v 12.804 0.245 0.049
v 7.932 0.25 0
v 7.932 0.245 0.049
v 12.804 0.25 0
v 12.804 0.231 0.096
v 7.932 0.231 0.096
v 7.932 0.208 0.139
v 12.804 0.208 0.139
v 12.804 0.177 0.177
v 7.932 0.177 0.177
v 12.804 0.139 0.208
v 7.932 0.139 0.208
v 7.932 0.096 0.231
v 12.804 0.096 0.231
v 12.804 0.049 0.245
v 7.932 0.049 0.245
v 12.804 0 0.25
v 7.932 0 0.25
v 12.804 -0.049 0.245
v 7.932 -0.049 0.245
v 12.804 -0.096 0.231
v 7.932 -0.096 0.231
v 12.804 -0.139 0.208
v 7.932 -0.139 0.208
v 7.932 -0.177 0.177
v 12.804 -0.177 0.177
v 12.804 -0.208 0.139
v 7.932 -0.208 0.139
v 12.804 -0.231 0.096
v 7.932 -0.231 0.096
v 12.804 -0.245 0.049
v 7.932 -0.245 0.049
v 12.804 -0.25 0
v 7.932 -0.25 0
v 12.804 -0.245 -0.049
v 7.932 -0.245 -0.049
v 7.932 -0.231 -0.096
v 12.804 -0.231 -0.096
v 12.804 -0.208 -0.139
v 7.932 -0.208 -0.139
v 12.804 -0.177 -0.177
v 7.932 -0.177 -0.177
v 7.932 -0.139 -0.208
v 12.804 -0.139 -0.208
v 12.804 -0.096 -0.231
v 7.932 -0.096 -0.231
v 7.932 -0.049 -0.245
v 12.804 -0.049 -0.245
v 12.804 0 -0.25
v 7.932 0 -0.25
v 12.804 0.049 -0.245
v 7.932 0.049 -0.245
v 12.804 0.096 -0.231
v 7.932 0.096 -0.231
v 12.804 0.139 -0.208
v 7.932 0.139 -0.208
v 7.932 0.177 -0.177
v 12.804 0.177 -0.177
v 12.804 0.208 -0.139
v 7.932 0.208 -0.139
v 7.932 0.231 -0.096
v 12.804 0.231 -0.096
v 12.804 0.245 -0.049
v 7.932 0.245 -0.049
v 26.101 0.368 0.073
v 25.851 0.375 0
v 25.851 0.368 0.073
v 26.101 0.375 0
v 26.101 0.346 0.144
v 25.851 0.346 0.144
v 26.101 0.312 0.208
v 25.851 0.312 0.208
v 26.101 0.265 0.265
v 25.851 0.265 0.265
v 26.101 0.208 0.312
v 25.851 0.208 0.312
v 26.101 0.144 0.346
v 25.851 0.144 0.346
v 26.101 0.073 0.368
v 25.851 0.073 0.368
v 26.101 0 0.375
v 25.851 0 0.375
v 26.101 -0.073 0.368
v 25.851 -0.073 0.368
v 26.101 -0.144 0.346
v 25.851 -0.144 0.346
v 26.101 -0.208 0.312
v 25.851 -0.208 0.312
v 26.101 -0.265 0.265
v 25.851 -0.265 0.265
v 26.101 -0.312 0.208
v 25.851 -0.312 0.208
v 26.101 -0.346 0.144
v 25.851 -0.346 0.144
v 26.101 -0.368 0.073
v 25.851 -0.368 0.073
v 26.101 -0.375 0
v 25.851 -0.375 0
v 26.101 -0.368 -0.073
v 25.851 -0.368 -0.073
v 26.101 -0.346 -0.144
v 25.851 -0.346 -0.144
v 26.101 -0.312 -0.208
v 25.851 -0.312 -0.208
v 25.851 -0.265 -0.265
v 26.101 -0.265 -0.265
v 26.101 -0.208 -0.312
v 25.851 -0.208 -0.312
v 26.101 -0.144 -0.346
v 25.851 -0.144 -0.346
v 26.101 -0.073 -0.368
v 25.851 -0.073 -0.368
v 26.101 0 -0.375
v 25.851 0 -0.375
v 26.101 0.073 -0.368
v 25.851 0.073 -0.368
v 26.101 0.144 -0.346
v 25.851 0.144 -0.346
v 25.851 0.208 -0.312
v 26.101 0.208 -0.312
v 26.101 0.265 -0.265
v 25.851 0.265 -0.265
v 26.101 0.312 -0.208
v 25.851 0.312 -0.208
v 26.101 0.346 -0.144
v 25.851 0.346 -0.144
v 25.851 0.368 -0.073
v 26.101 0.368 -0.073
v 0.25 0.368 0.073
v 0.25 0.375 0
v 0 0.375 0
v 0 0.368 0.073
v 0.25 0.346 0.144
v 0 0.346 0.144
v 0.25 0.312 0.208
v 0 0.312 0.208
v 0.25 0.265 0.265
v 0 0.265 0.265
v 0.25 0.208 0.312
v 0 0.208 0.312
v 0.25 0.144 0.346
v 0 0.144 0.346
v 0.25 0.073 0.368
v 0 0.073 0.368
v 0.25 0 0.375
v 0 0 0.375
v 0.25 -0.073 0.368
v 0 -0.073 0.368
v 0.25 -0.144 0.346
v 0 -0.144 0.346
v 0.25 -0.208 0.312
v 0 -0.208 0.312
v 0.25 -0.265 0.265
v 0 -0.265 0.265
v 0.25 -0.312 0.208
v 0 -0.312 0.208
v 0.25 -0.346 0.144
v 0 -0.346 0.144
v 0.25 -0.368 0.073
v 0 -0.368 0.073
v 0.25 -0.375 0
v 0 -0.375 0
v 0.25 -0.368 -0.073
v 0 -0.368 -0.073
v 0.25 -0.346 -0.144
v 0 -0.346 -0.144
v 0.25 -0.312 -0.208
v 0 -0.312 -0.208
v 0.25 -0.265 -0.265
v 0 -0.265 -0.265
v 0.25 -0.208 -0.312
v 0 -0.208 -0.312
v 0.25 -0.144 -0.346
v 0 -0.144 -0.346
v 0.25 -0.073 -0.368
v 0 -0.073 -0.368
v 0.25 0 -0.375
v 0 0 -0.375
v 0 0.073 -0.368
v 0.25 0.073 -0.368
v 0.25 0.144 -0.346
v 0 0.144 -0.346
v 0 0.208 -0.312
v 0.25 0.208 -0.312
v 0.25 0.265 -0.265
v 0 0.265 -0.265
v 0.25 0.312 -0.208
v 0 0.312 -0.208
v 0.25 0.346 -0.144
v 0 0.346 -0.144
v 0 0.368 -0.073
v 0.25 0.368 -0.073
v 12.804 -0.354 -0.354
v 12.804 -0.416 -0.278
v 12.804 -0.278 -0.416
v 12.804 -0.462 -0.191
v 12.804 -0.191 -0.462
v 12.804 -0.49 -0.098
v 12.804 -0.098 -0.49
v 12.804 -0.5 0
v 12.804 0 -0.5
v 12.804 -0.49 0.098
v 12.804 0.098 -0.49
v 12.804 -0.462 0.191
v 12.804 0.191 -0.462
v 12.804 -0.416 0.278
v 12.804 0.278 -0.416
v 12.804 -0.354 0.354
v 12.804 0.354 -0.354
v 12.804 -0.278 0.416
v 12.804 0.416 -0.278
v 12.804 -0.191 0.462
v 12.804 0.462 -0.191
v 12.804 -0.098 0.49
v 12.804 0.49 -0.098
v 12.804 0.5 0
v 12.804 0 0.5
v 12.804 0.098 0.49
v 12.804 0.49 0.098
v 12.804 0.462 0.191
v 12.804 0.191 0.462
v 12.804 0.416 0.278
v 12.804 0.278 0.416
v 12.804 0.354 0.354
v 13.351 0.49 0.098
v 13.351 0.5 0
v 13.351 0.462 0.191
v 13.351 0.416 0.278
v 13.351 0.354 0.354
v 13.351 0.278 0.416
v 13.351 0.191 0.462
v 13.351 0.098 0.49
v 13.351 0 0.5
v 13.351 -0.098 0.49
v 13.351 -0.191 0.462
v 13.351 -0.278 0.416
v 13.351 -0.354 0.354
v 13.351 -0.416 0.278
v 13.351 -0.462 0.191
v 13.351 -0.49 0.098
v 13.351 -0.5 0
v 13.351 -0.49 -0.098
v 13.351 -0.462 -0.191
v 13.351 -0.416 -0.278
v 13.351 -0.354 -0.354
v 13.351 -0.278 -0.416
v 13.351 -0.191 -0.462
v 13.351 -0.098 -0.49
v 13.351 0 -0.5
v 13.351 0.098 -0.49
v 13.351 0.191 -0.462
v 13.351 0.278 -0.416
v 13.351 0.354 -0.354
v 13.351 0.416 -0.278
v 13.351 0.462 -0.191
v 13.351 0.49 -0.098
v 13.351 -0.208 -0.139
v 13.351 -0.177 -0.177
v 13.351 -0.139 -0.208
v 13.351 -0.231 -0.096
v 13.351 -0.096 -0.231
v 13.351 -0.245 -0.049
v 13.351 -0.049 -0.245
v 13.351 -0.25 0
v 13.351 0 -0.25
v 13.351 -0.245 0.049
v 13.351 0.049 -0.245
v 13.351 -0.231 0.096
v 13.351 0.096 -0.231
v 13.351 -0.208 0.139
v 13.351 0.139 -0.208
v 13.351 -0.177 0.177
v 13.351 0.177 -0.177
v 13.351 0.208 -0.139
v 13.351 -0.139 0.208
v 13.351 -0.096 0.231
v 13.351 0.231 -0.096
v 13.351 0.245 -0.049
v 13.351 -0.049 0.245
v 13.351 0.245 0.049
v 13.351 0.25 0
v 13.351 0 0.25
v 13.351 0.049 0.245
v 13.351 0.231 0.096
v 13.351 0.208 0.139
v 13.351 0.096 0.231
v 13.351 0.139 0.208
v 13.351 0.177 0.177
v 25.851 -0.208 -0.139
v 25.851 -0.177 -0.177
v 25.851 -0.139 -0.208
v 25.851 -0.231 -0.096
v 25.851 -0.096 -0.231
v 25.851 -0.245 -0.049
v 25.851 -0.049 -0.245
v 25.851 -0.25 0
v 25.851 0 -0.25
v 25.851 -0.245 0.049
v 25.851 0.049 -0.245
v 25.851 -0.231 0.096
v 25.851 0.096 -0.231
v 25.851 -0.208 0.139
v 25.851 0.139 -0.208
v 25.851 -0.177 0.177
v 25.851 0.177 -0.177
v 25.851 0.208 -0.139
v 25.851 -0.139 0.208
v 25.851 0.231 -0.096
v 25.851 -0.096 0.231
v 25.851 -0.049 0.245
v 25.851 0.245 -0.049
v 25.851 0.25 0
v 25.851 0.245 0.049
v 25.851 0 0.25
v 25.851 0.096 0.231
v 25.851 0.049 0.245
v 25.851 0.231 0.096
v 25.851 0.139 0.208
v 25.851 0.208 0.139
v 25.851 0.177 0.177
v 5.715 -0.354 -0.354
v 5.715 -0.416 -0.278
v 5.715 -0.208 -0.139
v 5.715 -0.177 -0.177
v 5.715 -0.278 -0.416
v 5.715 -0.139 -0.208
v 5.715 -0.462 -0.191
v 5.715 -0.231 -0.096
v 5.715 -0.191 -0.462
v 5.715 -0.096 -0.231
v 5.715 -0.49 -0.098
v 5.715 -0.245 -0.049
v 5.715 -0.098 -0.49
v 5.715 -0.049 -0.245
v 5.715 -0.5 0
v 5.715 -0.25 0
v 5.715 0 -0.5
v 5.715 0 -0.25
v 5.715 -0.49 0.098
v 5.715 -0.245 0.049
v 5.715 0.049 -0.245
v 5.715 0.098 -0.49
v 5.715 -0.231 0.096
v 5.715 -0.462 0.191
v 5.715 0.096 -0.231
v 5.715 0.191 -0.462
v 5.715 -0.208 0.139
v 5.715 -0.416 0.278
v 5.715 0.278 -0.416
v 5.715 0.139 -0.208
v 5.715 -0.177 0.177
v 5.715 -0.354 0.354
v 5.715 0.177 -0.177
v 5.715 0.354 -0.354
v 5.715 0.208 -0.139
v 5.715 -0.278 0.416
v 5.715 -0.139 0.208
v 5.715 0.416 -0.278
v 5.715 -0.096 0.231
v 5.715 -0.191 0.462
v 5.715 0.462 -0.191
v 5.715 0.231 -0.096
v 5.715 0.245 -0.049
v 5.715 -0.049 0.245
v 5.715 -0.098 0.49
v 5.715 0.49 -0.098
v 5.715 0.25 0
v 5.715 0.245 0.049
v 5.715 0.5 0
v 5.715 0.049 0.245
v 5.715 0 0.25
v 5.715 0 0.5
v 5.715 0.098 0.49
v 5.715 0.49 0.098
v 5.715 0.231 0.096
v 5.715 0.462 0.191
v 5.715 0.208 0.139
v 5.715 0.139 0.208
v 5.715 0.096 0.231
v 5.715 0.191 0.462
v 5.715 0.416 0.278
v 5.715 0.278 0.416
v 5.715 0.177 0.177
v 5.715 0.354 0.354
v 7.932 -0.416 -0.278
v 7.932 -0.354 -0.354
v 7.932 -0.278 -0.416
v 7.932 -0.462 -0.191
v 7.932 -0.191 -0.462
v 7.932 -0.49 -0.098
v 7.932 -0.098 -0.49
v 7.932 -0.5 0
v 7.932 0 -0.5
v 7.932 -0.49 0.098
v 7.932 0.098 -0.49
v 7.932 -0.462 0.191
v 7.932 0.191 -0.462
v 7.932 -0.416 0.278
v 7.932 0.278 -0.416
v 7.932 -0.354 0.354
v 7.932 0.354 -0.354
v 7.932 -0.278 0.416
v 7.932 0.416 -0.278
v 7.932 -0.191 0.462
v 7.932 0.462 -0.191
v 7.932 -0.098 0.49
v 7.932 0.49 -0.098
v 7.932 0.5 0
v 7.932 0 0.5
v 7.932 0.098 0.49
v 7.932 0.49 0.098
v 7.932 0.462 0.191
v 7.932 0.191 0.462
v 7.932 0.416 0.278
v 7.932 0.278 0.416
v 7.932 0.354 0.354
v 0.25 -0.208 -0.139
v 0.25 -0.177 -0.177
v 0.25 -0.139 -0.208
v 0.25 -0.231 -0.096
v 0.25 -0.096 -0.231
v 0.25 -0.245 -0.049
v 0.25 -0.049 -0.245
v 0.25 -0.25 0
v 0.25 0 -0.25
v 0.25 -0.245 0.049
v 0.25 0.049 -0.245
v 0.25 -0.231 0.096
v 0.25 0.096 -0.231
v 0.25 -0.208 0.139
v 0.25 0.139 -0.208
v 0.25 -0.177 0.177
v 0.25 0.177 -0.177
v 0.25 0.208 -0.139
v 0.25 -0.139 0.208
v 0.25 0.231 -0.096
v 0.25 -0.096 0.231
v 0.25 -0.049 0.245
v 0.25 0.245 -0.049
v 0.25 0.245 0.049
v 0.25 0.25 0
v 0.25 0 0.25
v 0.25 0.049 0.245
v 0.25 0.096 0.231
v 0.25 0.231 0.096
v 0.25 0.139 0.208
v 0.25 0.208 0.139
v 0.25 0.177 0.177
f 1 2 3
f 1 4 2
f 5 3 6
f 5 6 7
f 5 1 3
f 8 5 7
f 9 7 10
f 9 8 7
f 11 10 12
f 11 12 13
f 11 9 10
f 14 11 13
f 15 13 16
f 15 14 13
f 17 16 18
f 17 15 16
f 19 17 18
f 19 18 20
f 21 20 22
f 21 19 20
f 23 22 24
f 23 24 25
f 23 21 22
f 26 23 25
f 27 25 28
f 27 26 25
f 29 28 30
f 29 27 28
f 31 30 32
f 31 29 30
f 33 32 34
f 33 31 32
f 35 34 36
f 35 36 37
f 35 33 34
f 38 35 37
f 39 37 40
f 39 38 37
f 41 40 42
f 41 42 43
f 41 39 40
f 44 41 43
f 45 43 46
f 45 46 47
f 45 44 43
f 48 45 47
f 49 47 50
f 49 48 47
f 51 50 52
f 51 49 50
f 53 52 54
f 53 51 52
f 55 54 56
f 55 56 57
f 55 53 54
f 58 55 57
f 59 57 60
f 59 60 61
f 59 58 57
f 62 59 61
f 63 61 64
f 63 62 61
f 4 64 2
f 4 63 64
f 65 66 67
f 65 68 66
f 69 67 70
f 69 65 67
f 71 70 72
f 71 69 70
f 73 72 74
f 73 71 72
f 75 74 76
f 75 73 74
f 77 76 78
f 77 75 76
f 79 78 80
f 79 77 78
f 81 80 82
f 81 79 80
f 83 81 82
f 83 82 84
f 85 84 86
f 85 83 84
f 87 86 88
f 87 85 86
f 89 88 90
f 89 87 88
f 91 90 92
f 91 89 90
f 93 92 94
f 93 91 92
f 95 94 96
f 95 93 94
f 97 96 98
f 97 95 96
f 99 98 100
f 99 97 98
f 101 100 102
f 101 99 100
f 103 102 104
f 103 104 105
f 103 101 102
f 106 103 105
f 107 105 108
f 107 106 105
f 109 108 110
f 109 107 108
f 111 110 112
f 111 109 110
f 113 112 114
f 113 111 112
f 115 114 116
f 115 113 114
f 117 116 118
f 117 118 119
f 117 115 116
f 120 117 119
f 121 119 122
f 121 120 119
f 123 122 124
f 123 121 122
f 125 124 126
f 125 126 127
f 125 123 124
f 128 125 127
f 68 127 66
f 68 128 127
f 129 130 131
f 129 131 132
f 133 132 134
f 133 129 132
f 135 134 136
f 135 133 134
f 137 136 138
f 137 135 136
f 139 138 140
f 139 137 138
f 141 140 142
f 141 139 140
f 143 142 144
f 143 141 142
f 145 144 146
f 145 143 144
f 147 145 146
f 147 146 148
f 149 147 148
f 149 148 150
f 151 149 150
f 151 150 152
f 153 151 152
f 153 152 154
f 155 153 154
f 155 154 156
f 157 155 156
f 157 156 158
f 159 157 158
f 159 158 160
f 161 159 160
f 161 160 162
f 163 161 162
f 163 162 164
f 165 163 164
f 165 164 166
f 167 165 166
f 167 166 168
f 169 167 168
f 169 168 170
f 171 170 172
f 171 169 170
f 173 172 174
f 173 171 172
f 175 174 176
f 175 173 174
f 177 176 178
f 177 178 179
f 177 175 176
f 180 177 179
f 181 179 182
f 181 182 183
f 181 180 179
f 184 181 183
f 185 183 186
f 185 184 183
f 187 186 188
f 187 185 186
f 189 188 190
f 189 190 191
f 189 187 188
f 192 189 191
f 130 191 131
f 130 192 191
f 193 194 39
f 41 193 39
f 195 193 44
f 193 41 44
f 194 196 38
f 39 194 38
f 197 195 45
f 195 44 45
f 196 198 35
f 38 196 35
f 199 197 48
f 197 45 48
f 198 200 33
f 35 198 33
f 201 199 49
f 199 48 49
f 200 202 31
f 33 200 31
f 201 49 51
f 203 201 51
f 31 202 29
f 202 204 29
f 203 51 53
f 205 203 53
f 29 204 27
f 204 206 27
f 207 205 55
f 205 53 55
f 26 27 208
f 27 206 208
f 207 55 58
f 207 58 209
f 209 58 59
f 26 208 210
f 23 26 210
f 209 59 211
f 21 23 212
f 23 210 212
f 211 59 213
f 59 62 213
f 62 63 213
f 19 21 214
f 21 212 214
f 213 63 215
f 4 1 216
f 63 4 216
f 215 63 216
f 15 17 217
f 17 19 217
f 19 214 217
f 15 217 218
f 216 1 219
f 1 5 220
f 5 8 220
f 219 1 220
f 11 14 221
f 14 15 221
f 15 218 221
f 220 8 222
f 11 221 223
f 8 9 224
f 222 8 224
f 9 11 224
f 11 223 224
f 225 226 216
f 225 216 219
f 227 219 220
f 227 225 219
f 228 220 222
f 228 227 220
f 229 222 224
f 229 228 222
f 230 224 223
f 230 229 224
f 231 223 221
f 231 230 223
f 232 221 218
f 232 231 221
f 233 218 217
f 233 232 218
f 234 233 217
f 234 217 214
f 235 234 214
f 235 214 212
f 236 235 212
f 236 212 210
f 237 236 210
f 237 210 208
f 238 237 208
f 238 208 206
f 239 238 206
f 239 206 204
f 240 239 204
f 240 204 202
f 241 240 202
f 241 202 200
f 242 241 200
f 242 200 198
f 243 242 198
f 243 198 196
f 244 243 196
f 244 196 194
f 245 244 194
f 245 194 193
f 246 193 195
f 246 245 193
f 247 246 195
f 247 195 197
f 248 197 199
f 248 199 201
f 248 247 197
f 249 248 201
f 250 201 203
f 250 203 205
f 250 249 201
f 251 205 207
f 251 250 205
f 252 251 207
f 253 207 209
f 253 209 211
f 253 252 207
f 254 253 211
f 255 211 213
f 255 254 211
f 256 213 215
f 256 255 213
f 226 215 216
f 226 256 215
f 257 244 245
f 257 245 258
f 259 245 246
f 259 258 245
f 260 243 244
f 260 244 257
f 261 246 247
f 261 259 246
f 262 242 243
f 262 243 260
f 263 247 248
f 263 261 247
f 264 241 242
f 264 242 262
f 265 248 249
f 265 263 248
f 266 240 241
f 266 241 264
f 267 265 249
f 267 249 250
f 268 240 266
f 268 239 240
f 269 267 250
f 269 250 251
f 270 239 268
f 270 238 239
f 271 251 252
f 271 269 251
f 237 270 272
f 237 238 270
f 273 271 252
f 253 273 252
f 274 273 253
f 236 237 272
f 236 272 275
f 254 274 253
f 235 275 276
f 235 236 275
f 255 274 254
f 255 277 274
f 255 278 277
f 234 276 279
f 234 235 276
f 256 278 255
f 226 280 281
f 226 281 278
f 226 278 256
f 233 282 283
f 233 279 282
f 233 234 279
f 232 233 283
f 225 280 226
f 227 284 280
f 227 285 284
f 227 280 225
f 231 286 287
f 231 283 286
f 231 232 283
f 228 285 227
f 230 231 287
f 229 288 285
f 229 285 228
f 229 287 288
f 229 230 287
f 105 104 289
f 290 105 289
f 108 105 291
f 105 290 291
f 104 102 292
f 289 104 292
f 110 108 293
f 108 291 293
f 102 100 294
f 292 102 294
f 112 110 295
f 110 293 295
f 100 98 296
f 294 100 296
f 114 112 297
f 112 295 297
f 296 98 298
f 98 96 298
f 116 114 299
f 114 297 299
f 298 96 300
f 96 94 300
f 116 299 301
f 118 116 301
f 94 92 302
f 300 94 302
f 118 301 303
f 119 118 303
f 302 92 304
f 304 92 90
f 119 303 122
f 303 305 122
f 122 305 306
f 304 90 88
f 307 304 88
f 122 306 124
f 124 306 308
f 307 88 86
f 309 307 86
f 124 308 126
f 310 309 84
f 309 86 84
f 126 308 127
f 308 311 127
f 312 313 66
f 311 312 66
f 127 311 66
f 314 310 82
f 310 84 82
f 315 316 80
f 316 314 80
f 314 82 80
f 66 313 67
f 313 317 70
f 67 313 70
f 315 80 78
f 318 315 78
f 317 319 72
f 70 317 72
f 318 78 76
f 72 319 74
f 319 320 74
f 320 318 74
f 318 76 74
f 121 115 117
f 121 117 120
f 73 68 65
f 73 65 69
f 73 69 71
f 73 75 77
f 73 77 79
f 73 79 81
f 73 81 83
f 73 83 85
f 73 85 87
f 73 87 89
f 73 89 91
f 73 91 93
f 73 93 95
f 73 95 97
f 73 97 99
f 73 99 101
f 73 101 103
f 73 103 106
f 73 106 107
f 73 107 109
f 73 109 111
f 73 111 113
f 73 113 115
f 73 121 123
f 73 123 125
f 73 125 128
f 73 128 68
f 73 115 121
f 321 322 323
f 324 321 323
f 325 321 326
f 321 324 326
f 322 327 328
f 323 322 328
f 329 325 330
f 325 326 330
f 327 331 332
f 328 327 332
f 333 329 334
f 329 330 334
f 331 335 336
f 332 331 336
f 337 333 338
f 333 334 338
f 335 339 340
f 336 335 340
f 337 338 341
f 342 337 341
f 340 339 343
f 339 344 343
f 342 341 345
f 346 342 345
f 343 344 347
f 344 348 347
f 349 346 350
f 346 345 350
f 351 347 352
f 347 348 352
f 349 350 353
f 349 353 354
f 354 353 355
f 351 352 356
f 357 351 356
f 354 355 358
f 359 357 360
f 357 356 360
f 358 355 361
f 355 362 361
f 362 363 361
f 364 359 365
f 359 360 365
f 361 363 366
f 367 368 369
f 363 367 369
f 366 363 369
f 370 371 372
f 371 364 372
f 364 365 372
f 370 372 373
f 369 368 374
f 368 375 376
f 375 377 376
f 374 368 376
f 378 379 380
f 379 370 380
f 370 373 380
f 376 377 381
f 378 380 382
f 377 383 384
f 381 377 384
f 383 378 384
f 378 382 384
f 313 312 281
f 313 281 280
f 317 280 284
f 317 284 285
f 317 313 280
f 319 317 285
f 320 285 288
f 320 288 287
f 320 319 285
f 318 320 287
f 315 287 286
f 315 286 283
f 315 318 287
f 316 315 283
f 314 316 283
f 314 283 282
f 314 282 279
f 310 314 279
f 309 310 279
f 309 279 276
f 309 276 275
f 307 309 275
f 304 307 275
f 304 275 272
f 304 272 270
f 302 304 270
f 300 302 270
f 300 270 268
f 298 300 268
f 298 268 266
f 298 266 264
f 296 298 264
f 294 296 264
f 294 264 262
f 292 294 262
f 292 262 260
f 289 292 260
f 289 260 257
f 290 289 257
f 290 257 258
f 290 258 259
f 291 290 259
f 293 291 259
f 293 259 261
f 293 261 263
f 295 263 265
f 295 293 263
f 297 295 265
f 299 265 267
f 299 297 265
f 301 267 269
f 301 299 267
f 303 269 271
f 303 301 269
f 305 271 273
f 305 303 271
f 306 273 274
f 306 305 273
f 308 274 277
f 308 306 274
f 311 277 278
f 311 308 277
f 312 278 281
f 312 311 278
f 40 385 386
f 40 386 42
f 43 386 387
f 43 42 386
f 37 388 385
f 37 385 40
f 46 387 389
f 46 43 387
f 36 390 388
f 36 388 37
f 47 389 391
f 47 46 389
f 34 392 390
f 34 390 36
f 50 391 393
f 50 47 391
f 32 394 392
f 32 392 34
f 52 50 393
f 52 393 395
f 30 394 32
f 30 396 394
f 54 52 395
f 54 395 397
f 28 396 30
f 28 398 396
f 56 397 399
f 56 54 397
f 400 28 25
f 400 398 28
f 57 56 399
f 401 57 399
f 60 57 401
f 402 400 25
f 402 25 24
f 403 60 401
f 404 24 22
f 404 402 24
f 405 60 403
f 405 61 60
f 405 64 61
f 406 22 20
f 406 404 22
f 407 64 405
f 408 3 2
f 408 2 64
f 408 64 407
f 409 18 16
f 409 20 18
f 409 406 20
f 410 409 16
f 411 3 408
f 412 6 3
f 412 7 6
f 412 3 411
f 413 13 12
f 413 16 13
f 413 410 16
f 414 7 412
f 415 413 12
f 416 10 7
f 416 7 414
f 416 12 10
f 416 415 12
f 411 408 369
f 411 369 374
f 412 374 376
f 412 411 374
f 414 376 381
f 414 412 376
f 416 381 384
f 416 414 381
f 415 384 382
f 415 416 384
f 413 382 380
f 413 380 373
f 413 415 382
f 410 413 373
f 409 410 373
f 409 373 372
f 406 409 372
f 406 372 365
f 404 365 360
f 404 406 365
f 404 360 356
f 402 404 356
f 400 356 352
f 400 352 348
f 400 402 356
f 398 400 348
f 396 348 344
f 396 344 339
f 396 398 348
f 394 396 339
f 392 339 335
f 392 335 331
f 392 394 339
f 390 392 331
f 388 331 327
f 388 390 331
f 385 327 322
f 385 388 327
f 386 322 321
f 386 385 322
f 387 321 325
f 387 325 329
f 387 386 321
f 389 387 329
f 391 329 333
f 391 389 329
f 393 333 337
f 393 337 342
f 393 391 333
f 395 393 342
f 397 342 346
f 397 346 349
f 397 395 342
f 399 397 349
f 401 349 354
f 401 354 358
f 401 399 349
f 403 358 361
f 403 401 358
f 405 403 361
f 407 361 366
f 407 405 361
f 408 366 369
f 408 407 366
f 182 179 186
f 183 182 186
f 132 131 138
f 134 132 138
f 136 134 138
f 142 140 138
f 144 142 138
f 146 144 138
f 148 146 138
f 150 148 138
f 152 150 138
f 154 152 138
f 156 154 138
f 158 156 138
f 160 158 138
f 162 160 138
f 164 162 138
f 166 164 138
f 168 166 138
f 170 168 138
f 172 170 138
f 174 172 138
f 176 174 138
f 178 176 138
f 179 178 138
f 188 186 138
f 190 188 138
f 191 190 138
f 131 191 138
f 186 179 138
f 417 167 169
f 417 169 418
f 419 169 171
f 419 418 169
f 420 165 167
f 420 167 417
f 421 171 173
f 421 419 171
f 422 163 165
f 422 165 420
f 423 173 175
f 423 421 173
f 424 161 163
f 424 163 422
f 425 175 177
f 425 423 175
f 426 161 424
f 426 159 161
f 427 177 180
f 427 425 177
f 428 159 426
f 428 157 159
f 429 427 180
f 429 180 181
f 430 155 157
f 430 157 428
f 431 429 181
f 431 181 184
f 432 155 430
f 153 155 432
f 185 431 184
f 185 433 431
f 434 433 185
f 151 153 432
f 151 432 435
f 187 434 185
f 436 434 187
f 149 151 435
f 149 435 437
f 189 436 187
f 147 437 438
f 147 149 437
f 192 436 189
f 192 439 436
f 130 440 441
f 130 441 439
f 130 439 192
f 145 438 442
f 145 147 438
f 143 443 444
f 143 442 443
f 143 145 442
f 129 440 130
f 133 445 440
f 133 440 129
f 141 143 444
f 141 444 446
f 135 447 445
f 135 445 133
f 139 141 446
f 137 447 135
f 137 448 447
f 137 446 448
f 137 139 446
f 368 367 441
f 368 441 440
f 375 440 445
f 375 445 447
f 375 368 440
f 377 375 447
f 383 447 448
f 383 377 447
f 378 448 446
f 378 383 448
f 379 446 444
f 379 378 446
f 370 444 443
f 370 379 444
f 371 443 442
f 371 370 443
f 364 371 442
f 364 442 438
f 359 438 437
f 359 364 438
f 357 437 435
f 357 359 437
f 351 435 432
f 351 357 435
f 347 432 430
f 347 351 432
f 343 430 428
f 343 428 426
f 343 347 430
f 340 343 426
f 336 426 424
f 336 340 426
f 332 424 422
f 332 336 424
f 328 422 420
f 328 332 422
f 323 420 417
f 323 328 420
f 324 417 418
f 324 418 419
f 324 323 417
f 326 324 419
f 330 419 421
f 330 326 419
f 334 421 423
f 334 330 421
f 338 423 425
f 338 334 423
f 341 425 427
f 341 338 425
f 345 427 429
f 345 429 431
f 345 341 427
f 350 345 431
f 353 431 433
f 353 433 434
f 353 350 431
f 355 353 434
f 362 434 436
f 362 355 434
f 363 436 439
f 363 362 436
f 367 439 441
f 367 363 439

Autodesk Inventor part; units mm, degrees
ref_plane "Start Plane" through (0, 0, 0) normal (1, 0, 0) x (0, 1, 0)
ref_plane "XZ Plane" through (0, 0, 0) normal (0, 1, 0) x (-1, 0, 0)
ref_plane "XY Plane" through (0, 0, 0) normal (0, 0, 1) x (1, 0, 0)
sketch "Main Sketch" plane through (0, 0, 0) normal (0, 0, 1) x (1, 0, 0)
  line L0 (0, 0) -> (26.101, 0)
  line L1 (0, 0) -> (0, 0.375)
  line L2 (0.25, 0.375) -> (0.25, 0.25)
  line L3 (0, 0.375) -> (0.25, 0.375)
  line L4 (5.715, 0.25) -> (5.715, 0.5)
  line L5 (0.25, 0.25) -> (5.715, 0.25)
  line L6 (7.932, 0.5) -> (7.932, 0.25)
  line L7 (5.715, 0.5) -> (7.932, 0.5)
  line L8 (7.932, 0.25) -> (12.804, 0.25)
  line L9 (13.351, 0.5) -> (13.351, 0.25)
  line L10 (12.804, 0.5) -> (13.351, 0.5)
  line L11 (13.351, 0.25) -> (25.851, 0.25)
  line L12 (25.851, 0.25) -> (25.851, 0.375)
  line L13 (26.101, 0.375) -> (26.101, 0)
  line L14 (25.851, 0.375) -> (26.101, 0.375)
  line L15 (12.804, 0.25) -> (12.804, 0.5)
  dimension "d3" = 0.75
  dimension "d6" = 0.5
  dimension "d7" = 1
  dimension "d8" = 0.5
  dimension "d9" = 1
  dimension "d10" = 0.5
  dimension "d11" = 0.75
revolve "Revolution1" add sketch "Main Sketch" angle 360 about axis through (0, 0, 0) along (1, 0, 0)
fillet "Fillet1" [suppressed]
equation "\"Length\" = 26.101"
properties part number "Shaft" material "Steel"
